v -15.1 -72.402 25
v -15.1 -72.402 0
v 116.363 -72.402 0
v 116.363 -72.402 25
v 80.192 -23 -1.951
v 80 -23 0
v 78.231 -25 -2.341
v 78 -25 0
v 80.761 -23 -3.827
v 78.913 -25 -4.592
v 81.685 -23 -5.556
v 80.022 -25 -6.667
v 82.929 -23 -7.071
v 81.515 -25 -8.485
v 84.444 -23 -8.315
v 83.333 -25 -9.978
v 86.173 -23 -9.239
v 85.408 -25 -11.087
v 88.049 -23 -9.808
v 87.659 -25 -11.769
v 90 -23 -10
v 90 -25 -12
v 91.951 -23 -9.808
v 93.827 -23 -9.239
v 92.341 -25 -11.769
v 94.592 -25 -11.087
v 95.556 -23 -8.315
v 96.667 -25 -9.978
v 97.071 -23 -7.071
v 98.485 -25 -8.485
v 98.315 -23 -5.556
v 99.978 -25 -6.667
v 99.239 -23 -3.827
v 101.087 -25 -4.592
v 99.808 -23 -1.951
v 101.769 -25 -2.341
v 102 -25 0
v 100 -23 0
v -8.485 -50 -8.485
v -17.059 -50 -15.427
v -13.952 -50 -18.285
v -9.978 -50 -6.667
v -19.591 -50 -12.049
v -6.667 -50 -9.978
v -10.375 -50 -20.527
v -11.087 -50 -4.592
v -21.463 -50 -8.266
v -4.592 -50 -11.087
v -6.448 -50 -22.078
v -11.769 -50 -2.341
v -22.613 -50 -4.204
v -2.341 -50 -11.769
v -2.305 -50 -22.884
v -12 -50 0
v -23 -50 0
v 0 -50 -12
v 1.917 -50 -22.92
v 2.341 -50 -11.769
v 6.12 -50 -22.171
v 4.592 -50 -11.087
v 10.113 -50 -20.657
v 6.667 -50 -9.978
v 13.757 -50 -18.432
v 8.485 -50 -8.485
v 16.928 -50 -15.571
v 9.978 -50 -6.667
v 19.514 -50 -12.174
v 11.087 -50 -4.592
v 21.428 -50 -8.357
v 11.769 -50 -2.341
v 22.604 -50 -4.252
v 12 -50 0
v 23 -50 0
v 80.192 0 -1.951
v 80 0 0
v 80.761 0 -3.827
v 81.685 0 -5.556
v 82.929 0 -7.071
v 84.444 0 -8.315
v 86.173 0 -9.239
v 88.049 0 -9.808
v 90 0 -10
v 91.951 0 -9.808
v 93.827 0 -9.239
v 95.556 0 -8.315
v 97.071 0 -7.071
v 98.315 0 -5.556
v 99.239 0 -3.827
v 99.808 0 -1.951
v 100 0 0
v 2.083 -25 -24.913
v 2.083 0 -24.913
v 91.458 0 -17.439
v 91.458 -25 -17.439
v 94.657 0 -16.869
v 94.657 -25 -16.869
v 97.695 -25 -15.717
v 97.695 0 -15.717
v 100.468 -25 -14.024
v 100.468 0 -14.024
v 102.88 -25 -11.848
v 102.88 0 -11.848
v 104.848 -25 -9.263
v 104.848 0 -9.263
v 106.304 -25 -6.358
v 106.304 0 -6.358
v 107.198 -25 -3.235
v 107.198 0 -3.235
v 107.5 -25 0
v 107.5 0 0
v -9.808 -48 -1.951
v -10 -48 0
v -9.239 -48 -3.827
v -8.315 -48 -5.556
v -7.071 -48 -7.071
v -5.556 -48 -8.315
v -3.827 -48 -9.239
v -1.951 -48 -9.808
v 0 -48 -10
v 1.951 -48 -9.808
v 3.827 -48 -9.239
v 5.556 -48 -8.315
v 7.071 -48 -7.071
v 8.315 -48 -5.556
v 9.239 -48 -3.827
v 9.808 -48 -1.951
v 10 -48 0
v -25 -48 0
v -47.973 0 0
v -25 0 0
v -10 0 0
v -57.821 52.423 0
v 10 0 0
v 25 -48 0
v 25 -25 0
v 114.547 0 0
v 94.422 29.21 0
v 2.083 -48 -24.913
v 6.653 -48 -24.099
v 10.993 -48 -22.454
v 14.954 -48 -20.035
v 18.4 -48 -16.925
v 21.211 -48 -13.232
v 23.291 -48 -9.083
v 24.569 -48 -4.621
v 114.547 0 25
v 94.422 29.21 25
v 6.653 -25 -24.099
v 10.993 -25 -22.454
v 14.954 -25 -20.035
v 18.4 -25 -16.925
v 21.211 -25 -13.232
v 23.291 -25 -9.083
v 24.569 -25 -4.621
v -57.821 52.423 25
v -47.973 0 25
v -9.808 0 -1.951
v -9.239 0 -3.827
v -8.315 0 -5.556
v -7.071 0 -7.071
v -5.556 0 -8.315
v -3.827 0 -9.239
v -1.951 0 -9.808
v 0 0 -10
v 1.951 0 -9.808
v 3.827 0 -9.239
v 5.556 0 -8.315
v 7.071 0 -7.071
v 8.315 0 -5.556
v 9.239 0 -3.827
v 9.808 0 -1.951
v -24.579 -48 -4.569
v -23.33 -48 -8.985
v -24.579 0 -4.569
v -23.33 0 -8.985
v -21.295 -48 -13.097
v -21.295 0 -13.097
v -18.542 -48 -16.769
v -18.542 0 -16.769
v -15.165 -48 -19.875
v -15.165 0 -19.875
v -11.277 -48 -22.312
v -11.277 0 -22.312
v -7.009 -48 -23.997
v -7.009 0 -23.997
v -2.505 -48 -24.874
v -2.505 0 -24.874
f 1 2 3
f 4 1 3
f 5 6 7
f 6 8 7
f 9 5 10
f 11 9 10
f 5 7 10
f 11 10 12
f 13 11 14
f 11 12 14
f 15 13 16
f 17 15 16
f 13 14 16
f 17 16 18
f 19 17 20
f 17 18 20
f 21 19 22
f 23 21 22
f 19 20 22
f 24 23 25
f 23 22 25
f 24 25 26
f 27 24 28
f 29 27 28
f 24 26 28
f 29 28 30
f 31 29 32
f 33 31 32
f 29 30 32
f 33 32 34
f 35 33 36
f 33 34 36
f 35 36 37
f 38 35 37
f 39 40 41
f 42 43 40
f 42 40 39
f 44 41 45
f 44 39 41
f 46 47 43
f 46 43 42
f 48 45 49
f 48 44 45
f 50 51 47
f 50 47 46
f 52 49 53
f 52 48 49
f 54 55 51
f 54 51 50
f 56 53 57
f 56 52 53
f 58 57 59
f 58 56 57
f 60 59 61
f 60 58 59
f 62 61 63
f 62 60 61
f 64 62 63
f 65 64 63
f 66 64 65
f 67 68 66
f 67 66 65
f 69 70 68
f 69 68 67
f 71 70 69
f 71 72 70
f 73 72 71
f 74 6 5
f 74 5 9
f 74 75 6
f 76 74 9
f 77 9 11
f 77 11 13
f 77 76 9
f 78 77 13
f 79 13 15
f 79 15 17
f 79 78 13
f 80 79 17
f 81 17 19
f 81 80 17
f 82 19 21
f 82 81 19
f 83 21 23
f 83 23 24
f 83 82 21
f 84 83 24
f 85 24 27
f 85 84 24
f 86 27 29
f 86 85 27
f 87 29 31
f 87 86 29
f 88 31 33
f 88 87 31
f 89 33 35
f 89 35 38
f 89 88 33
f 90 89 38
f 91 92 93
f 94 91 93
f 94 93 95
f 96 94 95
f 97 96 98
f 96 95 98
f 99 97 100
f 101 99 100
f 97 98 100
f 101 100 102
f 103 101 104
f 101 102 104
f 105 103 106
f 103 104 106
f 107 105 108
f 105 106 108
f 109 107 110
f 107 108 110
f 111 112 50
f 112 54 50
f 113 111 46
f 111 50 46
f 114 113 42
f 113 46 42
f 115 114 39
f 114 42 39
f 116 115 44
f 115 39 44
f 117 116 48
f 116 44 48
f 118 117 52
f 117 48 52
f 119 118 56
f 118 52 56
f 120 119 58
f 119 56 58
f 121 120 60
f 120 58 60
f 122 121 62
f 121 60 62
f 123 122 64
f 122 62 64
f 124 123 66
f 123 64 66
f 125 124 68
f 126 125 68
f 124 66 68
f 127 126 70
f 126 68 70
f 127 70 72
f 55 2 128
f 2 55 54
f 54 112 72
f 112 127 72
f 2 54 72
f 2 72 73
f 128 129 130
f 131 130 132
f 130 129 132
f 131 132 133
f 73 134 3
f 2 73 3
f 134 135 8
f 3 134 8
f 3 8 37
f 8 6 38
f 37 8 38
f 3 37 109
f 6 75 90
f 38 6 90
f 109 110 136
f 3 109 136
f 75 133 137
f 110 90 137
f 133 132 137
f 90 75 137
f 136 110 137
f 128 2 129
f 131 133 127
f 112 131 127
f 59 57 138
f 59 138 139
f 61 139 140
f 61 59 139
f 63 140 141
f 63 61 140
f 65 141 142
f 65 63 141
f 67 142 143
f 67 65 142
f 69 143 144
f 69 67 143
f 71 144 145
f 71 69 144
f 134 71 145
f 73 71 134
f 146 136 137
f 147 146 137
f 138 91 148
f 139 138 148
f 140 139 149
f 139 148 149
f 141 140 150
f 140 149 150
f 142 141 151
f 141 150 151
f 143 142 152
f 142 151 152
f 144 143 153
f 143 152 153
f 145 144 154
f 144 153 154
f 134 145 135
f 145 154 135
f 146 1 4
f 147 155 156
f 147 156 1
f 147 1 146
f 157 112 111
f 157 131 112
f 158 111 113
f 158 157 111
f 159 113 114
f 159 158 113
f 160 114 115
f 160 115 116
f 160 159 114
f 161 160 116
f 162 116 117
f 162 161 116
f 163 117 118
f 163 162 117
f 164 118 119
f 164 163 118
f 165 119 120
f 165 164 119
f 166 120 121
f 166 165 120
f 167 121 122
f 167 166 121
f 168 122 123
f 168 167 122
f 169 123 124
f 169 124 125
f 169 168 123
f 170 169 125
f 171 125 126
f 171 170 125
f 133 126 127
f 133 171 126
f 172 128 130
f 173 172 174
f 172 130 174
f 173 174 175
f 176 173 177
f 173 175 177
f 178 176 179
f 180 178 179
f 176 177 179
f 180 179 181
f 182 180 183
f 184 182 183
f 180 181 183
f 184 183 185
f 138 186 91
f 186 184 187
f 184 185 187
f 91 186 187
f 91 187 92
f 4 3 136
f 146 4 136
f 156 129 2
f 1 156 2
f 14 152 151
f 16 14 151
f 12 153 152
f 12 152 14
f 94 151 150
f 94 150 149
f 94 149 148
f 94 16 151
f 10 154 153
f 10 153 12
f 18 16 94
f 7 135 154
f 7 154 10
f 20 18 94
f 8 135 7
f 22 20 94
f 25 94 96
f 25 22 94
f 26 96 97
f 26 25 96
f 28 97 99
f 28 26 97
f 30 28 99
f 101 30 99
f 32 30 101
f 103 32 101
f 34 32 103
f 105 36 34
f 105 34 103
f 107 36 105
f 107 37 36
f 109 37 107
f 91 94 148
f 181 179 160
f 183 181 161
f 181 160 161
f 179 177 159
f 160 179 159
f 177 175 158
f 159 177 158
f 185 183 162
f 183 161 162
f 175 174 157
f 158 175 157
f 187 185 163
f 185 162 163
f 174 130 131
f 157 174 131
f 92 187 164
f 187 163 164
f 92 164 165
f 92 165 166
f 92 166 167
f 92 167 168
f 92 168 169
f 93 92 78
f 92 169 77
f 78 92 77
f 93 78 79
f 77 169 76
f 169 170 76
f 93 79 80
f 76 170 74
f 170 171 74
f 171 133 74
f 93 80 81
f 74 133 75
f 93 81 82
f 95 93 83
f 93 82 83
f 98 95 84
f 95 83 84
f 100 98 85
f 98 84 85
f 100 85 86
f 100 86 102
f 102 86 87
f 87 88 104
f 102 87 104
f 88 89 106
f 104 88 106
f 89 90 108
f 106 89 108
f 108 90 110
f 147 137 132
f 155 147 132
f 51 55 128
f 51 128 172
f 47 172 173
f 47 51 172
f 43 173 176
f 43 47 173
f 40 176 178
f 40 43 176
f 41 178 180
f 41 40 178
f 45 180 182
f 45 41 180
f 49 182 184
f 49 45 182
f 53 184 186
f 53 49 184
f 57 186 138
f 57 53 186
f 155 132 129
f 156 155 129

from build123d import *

# Parameters (mm, degrees)
F0_R     = 10
F1_DEPTH = 25
F2_DEPTH = 50
F3_SIZE  = 2
F5_DEPTH = 25


with BuildPart() as f1:
    # F0 (on Front) → F1 (new body)
    with BuildSketch(Plane.XZ):
        with BuildLine():
            ThreePointArc((2.083333, -24.913043), (18.399502, -16.92508), (25, 0))
            ThreePointArc((25, 0), (18.399502, 16.92508), (2.083333, 24.913043))
            ThreePointArc((2.083333, 24.913043), (-25, 0), (2.083333, -24.913043))
        make_face()
        Circle(F0_R, mode=Mode.SUBTRACT)
        with BuildLine():
            ThreePointArc((2.083333, 24.913043), (18.399502, 16.92508), (25, 0))
            ThreePointArc((25, 0), (18.399502, -16.92508), (2.083333, -24.913043))
            Line((2.083333, -24.913043), (91.458333, -17.43913))
            ThreePointArc((91.458333, -17.43913), (72.5, 0), (91.458333, 17.43913))
            Line((91.458333, 17.43913), (2.083333, 24.913043))
        make_face()
        with BuildLine():
            ThreePointArc((107.5, 0), (102.879651, 11.847556), (91.458333, 17.43913))
            ThreePointArc((91.458333, 17.43913), (72.5, 0), (91.458333, -17.43913))
            ThreePointArc((91.458333, -17.43913), (102.879651, -11.847556), (107.5, 0))
        make_face()
        with Locations((90, 0)):
            Circle(F0_R, mode=Mode.SUBTRACT)
    extrude(amount=F1_DEPTH)

    # F0 (on Front) → F2 (join)
    with BuildSketch(Plane.XZ):
        with BuildLine():
            ThreePointArc((2.083333, -24.913043), (18.399502, -16.92508), (25, 0))
            ThreePointArc((25, 0), (18.399502, 16.92508), (2.083333, 24.913043))
            ThreePointArc((2.083333, 24.913043), (-25, 0), (2.083333, -24.913043))
        make_face()
        Circle(F0_R, mode=Mode.SUBTRACT)
    extrude(amount=F2_DEPTH)

    # F3
    f3_edges = [f1.edges().sort_by_distance(p)[0] for p in [
        (-2.083333, -50, 24.913043),
        (-10, -50, 0),
        (80, -25, 0),
    ]]
    chamfer(f3_edges, length=F3_SIZE)

    # F4 (on Top) → F5 (join)
    with BuildSketch(Plane.XY):
        Polygon((116.36319, -72.40244), (114.546522, 0), (94.42164, 29.210314), (-57.820518, 52.423224), (-47.972556, 0), (-15.099764, -72.40244), align=None)
    extrude(amount=F5_DEPTH)


solid = f1.part
